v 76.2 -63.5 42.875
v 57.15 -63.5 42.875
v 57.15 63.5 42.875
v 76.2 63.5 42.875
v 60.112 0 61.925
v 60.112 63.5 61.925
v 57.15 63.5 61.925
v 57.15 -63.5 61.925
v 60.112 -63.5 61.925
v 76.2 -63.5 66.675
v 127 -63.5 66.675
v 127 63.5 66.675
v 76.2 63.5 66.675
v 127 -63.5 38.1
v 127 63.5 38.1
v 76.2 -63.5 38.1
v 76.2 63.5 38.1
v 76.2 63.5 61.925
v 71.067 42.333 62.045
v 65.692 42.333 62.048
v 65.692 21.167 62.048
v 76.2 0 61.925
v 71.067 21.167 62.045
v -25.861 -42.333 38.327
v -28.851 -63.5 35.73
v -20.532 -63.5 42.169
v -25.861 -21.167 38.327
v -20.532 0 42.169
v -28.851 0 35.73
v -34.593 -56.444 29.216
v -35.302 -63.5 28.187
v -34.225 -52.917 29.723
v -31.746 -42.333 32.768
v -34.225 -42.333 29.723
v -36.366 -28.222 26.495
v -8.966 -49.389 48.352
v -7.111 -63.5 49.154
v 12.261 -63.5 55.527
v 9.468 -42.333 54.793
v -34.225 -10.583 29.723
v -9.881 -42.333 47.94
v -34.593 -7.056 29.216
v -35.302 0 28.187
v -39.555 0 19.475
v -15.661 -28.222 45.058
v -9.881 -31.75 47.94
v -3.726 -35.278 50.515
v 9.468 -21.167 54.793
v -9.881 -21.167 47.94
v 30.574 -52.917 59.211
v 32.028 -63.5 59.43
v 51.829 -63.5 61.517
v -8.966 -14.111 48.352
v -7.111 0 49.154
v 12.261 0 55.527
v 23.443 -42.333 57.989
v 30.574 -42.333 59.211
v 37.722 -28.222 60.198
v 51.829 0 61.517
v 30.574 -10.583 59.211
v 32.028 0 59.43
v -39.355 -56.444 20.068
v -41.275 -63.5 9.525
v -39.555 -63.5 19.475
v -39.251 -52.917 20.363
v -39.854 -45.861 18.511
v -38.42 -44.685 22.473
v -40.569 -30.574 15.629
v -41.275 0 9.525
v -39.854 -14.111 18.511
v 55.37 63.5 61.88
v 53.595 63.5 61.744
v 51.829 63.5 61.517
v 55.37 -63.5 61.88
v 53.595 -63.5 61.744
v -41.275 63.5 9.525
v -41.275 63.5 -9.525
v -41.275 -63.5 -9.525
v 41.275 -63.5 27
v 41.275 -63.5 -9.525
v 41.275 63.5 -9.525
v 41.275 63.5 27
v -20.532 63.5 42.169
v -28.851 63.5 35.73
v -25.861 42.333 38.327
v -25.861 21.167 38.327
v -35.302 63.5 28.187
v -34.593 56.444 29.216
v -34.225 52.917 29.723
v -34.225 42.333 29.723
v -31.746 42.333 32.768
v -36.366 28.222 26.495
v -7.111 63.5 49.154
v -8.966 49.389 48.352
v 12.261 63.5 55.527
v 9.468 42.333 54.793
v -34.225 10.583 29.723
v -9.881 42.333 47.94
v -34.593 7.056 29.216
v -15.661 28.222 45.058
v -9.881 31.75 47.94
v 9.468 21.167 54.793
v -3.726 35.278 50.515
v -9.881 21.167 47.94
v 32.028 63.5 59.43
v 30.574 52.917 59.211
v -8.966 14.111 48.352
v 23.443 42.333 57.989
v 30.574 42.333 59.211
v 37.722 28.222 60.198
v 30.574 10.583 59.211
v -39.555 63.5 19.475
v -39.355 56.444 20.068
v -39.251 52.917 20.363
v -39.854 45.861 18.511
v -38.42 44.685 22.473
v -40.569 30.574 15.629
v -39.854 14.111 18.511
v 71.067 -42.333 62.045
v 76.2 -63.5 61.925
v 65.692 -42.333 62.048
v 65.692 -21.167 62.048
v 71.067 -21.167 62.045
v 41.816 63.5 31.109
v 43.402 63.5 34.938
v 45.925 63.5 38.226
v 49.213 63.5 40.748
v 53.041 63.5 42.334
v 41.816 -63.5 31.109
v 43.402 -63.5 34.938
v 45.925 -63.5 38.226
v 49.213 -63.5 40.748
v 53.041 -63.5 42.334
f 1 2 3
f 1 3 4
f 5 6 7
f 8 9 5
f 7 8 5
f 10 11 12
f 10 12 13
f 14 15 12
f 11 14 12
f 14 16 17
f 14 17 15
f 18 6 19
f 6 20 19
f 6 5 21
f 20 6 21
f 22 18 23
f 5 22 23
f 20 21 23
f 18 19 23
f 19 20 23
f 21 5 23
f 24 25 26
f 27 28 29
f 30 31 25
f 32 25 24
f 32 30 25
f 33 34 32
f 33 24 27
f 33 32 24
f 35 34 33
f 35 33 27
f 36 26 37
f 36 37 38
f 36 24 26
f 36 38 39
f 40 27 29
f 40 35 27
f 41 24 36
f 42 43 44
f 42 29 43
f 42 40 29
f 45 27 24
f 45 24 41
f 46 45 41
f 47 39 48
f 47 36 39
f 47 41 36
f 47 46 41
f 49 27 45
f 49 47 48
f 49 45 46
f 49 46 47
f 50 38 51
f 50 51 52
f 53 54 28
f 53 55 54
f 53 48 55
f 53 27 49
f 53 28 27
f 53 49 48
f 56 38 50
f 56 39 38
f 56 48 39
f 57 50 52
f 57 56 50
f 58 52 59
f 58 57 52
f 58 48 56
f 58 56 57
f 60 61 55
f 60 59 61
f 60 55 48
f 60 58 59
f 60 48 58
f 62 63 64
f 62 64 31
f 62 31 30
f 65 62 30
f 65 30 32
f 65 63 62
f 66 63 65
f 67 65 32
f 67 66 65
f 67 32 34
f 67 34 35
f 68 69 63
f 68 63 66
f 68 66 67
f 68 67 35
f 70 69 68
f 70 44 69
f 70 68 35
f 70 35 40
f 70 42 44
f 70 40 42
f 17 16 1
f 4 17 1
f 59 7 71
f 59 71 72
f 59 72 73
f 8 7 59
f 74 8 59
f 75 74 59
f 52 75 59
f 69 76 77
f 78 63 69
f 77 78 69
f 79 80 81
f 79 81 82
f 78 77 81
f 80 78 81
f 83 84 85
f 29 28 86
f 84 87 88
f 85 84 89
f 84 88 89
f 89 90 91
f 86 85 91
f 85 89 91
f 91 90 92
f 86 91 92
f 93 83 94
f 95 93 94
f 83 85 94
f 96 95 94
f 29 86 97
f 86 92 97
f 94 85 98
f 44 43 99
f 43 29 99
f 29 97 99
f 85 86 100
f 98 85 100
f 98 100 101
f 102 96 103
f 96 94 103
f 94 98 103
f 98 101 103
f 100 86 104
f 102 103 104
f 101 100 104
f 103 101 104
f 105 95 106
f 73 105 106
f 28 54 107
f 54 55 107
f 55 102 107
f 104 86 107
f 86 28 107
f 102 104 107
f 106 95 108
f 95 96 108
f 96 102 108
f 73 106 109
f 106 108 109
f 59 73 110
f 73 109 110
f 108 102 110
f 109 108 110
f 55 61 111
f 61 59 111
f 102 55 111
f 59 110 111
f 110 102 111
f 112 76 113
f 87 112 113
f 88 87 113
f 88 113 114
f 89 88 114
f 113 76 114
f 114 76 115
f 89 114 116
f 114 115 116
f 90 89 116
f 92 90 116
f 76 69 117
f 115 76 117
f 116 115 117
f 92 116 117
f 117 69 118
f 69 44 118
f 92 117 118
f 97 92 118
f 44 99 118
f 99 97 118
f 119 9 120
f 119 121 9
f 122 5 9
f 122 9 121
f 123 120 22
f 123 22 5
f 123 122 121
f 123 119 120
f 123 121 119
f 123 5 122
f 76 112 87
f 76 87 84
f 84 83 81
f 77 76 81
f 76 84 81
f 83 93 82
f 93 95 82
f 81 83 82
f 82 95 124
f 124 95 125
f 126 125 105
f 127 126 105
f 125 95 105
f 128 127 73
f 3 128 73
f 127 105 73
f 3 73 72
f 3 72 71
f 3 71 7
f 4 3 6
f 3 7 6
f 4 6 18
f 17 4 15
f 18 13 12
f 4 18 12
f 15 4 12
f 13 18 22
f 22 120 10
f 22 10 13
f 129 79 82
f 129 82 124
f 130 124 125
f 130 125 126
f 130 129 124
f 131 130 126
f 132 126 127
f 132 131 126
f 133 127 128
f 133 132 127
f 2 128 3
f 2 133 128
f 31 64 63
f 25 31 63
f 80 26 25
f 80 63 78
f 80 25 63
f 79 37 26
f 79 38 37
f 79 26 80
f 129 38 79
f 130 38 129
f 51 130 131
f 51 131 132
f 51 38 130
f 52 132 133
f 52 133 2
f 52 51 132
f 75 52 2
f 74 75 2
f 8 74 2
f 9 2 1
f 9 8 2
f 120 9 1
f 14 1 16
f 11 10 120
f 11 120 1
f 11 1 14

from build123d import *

# Parameters (mm, degrees)
F0_W     = 25.4
F0_H     = 19.05
F0_H_2   = 4.7498
F0_H_3   = 4.7752
F1_DEPTH = 63.5


with BuildPart() as f1:
    # F0 (on Front) → F1 (new body, symmetric)
    with BuildSketch(Plane.XZ):
        Polygon((-41.275, -9.525), (41.275, -9.525), (41.275, 0), (41.275, 9.525), (22.225, 9.525), (-41.275, 9.525), align=None)
        with BuildLine():
            add(Edge.make_bspline(
                [(-41.275, 9.525), (-40.1127492215, 45.3608282082), (10.2455717383, 58.7983861186), (51.8289972112, 61.5174790689)],
                knots=[0, 0, 0, 0, 106.414059963, 106.414059963, 106.414059963, 106.414059963], degree=3))
            Line((-41.275, 9.525), (22.225, 9.525))
            Line((22.225, 9.525), (22.225, 27.0002))
            ThreePointArc((22.225, 27.0002), (30.63970344, 49.7369500162), (51.8289972112, 61.5174790689))
        make_face()
        with BuildLine():
            Line((22.225, 9.525), (41.275, 9.525))
            Line((41.275, 9.525), (41.275, 27.0002))
            ThreePointArc((41.275, 27.0002), (45.9246798487, 38.2255201513), (57.15, 42.8752))
            Line((57.15, 42.8752), (76.2, 42.8752))
            Line((76.2, 42.8752), (76.2, 61.9252))
            Line((76.2, 61.9252), (60.1124922335, 61.9252))
            add(Edge.make_bspline(
                [(51.8289972112, 61.5174790689), (54.6360932505, 61.7010318899), (57.4032025523, 61.8357412294), (60.1124922335, 61.9252)],
                knots=[106.414059963, 106.414059963, 106.414059963, 106.414059963, 113.5975587454, 113.5975587454, 113.5975587454, 113.5975587454], degree=3))
            ThreePointArc((51.8289972112, 61.5174790689), (30.63970344, 49.7369500162), (22.225, 27.0002))
            Line((22.225, 27.0002), (22.225, 9.525))
        make_face()
        with BuildLine():
            ThreePointArc((57.15, 61.9252), (54.4816996498, 61.8231205875), (51.8289972112, 61.5174790689))
            add(Edge.make_bspline(
                [(51.8289972112, 61.5174790689), (54.6360932505, 61.7010318899), (57.4032025523, 61.8357412294), (60.1124922335, 61.9252)],
                knots=[106.414059963, 106.414059963, 106.414059963, 106.414059963, 113.5975587454, 113.5975587454, 113.5975587454, 113.5975587454], degree=3))
            Line((60.1124922335, 61.9252), (57.15, 61.9252))
        make_face()
        with BuildLine():
            add(Edge.make_bspline(
                [(60.1124922335, 61.9252), (65.7827499857, 62.1124277781), (71.1997457835, 62.1014486601), (76.2, 61.9252)],
                knots=[113.5975587454, 113.5975587454, 113.5975587454, 113.5975587454, 128.6318645789, 128.6318645789, 128.6318645789, 128.6318645789], degree=3))
            Line((60.1124922335, 61.9252), (76.2, 61.9252))
        make_face()
        with Locations((88.9, 52.4002)):
            Rectangle(F0_W, F0_H)
        with Locations((88.9, 64.3001)):
            Rectangle(F0_W, F0_H_2)
        with Locations((88.9, 40.4876)):
            Rectangle(F0_W, F0_H_3)
        Polygon((101.6, 66.675), (101.6, 61.9252), (101.6, 42.8752), (101.6, 38.1), (127, 38.1), (127, 66.675), align=None)
    extrude(amount=F1_DEPTH, both=True)


solid = f1.part
